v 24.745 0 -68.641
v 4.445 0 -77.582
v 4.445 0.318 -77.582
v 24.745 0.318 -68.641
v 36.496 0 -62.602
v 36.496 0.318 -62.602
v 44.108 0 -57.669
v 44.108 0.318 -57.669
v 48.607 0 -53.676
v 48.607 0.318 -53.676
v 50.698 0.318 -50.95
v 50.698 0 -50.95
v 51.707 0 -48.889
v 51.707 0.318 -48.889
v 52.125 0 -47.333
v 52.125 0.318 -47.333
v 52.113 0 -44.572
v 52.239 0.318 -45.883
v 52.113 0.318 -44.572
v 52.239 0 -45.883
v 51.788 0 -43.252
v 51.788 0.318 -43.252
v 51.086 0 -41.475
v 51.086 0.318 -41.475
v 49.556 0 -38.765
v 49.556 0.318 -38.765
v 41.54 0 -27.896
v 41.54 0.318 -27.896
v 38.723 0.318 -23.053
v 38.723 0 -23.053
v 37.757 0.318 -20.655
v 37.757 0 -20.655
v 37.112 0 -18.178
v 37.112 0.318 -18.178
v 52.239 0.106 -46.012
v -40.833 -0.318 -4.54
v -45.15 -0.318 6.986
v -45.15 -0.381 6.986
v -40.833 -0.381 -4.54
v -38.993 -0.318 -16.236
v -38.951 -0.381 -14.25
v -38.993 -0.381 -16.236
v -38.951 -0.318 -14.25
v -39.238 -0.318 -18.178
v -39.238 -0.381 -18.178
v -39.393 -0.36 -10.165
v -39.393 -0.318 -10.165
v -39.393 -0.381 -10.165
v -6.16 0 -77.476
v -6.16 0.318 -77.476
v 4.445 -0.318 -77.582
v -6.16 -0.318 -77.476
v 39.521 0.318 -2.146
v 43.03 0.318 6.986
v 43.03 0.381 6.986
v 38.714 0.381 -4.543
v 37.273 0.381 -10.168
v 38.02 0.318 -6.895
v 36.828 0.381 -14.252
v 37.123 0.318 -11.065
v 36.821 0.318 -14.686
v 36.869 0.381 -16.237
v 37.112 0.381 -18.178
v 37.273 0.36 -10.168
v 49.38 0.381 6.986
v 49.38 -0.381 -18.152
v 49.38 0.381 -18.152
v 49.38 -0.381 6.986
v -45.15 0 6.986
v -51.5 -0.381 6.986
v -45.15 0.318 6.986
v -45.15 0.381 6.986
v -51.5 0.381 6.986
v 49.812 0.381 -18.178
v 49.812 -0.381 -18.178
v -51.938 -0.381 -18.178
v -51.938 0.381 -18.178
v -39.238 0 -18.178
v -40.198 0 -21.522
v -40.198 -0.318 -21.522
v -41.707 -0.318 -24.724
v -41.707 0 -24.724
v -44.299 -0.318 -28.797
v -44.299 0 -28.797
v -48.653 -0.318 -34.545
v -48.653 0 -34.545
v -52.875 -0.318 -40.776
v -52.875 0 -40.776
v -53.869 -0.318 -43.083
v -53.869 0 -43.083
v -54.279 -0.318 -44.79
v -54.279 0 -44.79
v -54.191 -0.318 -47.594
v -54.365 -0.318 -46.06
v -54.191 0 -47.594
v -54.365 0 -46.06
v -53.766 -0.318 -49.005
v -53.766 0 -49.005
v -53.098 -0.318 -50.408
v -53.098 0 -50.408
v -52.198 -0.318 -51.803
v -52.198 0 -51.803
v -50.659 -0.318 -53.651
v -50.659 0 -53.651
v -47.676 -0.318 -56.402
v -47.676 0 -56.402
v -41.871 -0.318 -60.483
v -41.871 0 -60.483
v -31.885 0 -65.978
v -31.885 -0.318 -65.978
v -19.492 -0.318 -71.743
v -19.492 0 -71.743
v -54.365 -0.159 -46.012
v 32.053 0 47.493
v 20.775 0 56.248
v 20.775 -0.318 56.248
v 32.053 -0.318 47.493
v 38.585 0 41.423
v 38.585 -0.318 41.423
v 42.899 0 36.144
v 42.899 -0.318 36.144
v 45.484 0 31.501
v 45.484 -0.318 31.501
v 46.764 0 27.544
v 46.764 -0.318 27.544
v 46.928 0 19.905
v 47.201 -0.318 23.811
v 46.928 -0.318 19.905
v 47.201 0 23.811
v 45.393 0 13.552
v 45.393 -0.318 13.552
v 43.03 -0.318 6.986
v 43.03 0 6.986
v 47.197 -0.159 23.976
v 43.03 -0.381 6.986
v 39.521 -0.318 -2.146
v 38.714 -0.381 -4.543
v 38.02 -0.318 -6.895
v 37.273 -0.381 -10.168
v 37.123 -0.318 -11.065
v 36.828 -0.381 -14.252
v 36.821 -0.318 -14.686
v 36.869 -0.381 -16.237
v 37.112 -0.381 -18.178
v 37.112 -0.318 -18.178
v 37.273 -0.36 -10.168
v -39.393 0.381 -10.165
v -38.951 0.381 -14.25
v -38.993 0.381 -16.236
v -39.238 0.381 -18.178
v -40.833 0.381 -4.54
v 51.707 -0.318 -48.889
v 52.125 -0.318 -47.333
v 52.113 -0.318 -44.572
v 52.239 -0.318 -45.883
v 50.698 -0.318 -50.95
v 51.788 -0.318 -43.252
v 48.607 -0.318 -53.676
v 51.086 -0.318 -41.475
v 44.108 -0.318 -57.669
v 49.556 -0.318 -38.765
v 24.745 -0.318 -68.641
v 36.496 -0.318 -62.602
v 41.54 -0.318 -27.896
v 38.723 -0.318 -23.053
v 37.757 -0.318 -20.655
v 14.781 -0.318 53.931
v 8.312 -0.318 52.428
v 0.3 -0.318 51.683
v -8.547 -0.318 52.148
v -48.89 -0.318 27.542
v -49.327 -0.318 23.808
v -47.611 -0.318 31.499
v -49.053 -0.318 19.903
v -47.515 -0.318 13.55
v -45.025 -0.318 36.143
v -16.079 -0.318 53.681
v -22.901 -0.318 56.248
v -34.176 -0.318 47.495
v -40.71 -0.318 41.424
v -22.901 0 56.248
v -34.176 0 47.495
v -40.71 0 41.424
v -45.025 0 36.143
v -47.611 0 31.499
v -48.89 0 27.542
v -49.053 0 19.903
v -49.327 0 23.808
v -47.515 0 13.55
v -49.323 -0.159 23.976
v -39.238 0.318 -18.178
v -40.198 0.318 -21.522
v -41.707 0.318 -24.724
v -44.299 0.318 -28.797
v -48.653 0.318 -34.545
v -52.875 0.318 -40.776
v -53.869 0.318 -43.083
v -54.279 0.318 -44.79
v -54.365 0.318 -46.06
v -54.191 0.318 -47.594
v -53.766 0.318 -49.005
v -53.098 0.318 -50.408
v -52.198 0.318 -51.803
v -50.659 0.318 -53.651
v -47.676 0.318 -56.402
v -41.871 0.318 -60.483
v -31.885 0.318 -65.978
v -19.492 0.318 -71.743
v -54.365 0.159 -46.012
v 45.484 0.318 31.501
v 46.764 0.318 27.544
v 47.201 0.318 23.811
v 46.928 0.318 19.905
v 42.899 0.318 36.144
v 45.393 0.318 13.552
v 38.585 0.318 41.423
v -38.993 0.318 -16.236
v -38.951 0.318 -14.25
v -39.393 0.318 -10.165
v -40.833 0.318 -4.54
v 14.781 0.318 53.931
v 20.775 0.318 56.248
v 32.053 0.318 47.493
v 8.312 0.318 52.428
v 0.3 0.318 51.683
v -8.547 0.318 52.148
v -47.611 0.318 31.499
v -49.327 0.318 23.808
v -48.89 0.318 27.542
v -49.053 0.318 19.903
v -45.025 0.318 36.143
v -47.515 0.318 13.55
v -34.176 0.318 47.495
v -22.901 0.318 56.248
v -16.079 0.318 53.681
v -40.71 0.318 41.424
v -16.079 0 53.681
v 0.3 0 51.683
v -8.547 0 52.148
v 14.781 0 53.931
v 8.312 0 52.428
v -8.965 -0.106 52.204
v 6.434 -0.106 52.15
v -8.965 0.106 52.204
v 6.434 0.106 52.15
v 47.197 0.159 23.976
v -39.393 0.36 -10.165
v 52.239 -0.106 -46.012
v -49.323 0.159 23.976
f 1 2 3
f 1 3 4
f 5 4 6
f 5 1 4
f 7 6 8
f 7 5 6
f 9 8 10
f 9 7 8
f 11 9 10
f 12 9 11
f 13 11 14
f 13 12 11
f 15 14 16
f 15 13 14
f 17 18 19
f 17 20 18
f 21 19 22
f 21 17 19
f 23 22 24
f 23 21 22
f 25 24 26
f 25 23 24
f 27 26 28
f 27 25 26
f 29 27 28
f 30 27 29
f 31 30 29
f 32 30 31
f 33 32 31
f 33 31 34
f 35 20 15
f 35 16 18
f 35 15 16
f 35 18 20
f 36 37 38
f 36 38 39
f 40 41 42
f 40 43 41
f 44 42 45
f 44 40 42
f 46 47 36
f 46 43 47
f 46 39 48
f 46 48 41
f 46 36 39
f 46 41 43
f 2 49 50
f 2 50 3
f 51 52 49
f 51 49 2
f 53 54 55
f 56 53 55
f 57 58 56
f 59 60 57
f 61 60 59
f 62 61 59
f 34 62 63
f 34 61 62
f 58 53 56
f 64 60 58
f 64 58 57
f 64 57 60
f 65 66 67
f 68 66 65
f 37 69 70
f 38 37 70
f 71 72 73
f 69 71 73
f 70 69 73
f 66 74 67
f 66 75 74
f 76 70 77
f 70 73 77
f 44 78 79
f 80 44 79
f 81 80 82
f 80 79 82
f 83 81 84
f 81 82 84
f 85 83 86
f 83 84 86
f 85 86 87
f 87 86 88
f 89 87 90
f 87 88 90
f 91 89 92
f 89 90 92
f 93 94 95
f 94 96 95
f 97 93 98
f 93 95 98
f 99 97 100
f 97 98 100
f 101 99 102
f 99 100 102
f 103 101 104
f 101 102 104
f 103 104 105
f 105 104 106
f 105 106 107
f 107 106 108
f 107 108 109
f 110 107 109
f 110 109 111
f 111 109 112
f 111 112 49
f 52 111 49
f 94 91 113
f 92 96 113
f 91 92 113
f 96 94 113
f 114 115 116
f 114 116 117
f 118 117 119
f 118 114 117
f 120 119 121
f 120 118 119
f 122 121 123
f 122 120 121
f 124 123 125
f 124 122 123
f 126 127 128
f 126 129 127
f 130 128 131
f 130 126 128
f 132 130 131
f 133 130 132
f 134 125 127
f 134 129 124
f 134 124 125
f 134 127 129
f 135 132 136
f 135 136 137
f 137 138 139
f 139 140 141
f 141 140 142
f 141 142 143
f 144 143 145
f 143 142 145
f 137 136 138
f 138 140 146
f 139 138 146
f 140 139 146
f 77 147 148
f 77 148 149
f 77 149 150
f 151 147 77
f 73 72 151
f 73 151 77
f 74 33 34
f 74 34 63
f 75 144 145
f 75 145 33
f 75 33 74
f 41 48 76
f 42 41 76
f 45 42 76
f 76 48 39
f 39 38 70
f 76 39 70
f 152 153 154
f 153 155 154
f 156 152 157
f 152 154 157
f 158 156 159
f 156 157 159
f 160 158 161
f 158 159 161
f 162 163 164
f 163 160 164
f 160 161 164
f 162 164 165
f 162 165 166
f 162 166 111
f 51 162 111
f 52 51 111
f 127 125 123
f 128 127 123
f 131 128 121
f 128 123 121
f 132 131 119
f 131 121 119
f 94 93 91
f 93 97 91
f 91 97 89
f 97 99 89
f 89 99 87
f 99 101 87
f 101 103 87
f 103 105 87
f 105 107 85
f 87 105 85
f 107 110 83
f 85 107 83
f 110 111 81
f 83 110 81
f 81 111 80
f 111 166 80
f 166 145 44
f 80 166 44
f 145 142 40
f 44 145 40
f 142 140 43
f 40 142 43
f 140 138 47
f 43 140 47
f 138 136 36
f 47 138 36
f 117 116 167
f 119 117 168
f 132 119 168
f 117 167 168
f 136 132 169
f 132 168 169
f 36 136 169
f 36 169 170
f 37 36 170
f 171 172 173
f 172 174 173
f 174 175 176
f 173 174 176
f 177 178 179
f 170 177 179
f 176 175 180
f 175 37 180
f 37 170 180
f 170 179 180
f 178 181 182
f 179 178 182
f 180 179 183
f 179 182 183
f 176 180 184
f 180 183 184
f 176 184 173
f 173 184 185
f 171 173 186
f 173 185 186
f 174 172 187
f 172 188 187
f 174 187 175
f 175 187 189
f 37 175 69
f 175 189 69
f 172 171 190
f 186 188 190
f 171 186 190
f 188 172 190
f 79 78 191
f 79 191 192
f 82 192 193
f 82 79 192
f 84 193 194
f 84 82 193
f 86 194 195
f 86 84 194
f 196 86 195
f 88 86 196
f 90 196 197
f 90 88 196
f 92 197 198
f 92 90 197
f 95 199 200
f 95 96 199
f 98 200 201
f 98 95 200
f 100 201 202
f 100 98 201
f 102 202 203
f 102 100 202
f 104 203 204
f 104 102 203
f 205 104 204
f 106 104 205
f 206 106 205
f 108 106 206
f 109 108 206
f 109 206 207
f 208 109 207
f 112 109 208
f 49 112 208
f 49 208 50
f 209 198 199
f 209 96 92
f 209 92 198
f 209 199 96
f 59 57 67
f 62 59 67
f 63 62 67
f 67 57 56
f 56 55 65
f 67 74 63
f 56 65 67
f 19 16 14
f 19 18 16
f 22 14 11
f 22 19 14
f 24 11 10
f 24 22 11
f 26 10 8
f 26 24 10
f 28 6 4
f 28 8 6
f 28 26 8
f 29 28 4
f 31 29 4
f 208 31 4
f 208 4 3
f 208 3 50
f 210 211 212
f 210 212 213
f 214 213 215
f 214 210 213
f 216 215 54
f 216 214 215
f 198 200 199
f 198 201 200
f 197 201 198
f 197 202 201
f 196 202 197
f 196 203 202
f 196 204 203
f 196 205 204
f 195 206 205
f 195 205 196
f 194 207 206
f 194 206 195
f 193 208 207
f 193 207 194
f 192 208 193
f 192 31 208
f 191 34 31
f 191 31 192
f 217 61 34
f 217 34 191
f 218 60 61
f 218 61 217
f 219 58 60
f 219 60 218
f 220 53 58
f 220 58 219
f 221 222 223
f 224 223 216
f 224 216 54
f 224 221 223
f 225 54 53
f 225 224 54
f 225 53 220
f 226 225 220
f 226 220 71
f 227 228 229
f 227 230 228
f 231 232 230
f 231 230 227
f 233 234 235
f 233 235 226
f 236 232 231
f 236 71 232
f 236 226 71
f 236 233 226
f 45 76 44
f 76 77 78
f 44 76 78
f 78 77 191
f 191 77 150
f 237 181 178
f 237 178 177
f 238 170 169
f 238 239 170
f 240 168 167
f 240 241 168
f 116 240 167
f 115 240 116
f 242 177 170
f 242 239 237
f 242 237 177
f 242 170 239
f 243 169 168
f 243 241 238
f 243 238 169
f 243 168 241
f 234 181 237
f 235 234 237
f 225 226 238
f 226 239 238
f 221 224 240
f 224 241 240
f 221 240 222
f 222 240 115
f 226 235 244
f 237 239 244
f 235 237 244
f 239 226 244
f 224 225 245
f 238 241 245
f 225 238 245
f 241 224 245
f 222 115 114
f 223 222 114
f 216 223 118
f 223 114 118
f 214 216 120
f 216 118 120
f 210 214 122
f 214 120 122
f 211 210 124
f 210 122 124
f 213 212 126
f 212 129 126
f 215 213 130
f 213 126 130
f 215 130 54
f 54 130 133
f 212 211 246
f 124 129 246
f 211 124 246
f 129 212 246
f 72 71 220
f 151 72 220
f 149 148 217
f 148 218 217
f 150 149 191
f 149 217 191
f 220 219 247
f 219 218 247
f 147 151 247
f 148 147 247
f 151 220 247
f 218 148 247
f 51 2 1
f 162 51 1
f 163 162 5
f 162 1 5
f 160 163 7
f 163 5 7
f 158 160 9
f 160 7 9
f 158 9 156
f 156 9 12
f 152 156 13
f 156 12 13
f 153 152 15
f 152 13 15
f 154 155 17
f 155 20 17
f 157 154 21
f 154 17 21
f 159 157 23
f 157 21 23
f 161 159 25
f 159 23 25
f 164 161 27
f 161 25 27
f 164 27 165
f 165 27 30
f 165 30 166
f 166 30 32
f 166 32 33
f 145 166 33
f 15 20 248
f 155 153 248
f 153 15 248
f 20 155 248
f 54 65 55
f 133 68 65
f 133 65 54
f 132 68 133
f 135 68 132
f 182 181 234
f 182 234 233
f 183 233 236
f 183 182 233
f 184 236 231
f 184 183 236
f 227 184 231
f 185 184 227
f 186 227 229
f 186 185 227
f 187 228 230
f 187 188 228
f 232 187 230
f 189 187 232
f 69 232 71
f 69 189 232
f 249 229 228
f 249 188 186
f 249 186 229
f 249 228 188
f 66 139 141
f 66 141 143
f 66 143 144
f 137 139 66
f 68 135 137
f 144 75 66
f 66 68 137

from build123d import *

# Parameters (mm, degrees)
F1_DEPTH = 0.3175
F2_DEPTH = 0.381


with BuildPart() as f1:
    # F0 (on Front) → F1 (new body, symmetric)
    with BuildSketch(Plane.XZ):
        with BuildLine():
            add(Edge.make_bspline(
                [(-22.9008918932, 56.2476531154), (-10.537274087, 50.2615567322), (7.8029912938, 50.0217043714), (20.7750153121, 56.2476531154)],
                knots=[0, 0, 0, 0, 43.6759072053, 43.6759072053, 43.6759072053, 43.6759072053], degree=3))
            add(Edge.make_bspline(
                [(-22.9008918932, 56.2476531154), (-35.9362598444, 46.5072653375), (-54.3591093121, 32.7412022341), (-47.4467227812, 12.8829538034), (-45.1502431526, 6.9859560012)],
                knots=[0, 0, 0, 0, 0.2459567395, 0.3476099795, 0.3476099795, 0.3476099795, 0.3476099795], degree=3))
            Line((-45.1502431526, 6.9859560012), (43.03002249, 6.9859560012))
            add(Edge.make_bspline(
                [(20.7750153121, 56.2476531154), (33.8197260221, 46.5002841694), (52.227050448, 32.745598424), (45.3242890236, 12.8831073765), (43.03002249, 6.9859560012)],
                knots=[0, 0, 0, 0, 0.2461330225, 0.3478414541, 0.3478414541, 0.3478414541, 0.3478414541], degree=3))
        make_face()
        with BuildLine():
            Line((43.03002249, 6.9859560012), (-45.1502431526, 6.9859560012))
            add(Edge.make_bspline(
                [(-45.1502431526, 6.9859560012), (-41.7823220091, -1.662334771), (-37.8228089863, -10.503671565), (-39.238193137, -18.1778215221)],
                knots=[0.3476099795, 0.3476099795, 0.3476099795, 0.3476099795, 0.4966903773, 0.4966903773, 0.4966903773, 0.4966903773], degree=3))
            Line((-39.238193137, -18.1778215221), (37.112316556, -18.1778215221))
            add(Edge.make_bspline(
                [(43.03002249, 6.9859560012), (39.6643640728, -1.6650864446), (35.7049395508, -10.5084842385), (37.112316556, -18.1778215221)],
                knots=[0.3478414541, 0.3478414541, 0.3478414541, 0.3478414541, 0.4970463671, 0.4970463671, 0.4970463671, 0.4970463671], degree=3))
        make_face()
        with BuildLine():
            Line((37.112316556, -18.1778215221), (-39.238193137, -18.1778215221))
            add(Edge.make_bspline(
                [(-39.238193137, -18.1778215221), (-41.2733057361, -29.2121115814), (-72.1432725438, -49.4548691202), (-30.225521453, -67.2562529331), (-6.160202813, -77.476170809)],
                knots=[0.4966903773, 0.4966903773, 0.4966903773, 0.4966903773, 0.7110458904, 1, 1, 1, 1], degree=3))
            Line((-6.160202813, -77.476170809), (4.4449903752, -77.5823235995))
            add(Edge.make_bspline(
                [(37.112316556, -18.1778215221), (39.135676473, -29.2038860323), (69.8887560982, -49.3665798991), (28.4678654147, -67.380430422), (4.4449903752, -77.5823235995)],
                knots=[0.4970463671, 0.4970463671, 0.4970463671, 0.4970463671, 0.7115555139, 1, 1, 1, 1], degree=3))
        make_face()
    extrude(amount=F1_DEPTH, both=True)

    # F0 (on Front) → F2 (join, symmetric)
    with BuildSketch(Plane.XZ):
        with BuildLine():
            add(Edge.make_bspline(
                [(-45.1502431526, 6.9859560012), (-41.7823220091, -1.662334771), (-37.8228089863, -10.503671565), (-39.238193137, -18.1778215221)],
                knots=[0.3476099795, 0.3476099795, 0.3476099795, 0.3476099795, 0.4966903773, 0.4966903773, 0.4966903773, 0.4966903773], degree=3))
            Line((-45.1502431526, 6.9859560012), (-51.5002431526, 6.9859560012))
            Line((-51.5002431526, 6.9859560012), (-51.938193137, -18.1778215221))
            Line((-51.938193137, -18.1778215221), (-39.238193137, -18.1778215221))
        make_face()
        with BuildLine():
            Line((49.38002249, 6.9859560012), (43.03002249, 6.9859560012))
            add(Edge.make_bspline(
                [(43.03002249, 6.9859560012), (39.6643640728, -1.6650864446), (35.7049395508, -10.5084842385), (37.112316556, -18.1778215221)],
                knots=[0.3478414541, 0.3478414541, 0.3478414541, 0.3478414541, 0.4970463671, 0.4970463671, 0.4970463671, 0.4970463671], degree=3))
            Line((37.112316556, -18.1778215221), (49.812316556, -18.1778215221))
            Line((49.812316556, -18.1778215221), (49.38002249, -18.1515775621))
            Line((49.38002249, -18.1515775621), (49.38002249, 6.9859560012))
        make_face()
    extrude(amount=F2_DEPTH, both=True)


solid = f1.part
